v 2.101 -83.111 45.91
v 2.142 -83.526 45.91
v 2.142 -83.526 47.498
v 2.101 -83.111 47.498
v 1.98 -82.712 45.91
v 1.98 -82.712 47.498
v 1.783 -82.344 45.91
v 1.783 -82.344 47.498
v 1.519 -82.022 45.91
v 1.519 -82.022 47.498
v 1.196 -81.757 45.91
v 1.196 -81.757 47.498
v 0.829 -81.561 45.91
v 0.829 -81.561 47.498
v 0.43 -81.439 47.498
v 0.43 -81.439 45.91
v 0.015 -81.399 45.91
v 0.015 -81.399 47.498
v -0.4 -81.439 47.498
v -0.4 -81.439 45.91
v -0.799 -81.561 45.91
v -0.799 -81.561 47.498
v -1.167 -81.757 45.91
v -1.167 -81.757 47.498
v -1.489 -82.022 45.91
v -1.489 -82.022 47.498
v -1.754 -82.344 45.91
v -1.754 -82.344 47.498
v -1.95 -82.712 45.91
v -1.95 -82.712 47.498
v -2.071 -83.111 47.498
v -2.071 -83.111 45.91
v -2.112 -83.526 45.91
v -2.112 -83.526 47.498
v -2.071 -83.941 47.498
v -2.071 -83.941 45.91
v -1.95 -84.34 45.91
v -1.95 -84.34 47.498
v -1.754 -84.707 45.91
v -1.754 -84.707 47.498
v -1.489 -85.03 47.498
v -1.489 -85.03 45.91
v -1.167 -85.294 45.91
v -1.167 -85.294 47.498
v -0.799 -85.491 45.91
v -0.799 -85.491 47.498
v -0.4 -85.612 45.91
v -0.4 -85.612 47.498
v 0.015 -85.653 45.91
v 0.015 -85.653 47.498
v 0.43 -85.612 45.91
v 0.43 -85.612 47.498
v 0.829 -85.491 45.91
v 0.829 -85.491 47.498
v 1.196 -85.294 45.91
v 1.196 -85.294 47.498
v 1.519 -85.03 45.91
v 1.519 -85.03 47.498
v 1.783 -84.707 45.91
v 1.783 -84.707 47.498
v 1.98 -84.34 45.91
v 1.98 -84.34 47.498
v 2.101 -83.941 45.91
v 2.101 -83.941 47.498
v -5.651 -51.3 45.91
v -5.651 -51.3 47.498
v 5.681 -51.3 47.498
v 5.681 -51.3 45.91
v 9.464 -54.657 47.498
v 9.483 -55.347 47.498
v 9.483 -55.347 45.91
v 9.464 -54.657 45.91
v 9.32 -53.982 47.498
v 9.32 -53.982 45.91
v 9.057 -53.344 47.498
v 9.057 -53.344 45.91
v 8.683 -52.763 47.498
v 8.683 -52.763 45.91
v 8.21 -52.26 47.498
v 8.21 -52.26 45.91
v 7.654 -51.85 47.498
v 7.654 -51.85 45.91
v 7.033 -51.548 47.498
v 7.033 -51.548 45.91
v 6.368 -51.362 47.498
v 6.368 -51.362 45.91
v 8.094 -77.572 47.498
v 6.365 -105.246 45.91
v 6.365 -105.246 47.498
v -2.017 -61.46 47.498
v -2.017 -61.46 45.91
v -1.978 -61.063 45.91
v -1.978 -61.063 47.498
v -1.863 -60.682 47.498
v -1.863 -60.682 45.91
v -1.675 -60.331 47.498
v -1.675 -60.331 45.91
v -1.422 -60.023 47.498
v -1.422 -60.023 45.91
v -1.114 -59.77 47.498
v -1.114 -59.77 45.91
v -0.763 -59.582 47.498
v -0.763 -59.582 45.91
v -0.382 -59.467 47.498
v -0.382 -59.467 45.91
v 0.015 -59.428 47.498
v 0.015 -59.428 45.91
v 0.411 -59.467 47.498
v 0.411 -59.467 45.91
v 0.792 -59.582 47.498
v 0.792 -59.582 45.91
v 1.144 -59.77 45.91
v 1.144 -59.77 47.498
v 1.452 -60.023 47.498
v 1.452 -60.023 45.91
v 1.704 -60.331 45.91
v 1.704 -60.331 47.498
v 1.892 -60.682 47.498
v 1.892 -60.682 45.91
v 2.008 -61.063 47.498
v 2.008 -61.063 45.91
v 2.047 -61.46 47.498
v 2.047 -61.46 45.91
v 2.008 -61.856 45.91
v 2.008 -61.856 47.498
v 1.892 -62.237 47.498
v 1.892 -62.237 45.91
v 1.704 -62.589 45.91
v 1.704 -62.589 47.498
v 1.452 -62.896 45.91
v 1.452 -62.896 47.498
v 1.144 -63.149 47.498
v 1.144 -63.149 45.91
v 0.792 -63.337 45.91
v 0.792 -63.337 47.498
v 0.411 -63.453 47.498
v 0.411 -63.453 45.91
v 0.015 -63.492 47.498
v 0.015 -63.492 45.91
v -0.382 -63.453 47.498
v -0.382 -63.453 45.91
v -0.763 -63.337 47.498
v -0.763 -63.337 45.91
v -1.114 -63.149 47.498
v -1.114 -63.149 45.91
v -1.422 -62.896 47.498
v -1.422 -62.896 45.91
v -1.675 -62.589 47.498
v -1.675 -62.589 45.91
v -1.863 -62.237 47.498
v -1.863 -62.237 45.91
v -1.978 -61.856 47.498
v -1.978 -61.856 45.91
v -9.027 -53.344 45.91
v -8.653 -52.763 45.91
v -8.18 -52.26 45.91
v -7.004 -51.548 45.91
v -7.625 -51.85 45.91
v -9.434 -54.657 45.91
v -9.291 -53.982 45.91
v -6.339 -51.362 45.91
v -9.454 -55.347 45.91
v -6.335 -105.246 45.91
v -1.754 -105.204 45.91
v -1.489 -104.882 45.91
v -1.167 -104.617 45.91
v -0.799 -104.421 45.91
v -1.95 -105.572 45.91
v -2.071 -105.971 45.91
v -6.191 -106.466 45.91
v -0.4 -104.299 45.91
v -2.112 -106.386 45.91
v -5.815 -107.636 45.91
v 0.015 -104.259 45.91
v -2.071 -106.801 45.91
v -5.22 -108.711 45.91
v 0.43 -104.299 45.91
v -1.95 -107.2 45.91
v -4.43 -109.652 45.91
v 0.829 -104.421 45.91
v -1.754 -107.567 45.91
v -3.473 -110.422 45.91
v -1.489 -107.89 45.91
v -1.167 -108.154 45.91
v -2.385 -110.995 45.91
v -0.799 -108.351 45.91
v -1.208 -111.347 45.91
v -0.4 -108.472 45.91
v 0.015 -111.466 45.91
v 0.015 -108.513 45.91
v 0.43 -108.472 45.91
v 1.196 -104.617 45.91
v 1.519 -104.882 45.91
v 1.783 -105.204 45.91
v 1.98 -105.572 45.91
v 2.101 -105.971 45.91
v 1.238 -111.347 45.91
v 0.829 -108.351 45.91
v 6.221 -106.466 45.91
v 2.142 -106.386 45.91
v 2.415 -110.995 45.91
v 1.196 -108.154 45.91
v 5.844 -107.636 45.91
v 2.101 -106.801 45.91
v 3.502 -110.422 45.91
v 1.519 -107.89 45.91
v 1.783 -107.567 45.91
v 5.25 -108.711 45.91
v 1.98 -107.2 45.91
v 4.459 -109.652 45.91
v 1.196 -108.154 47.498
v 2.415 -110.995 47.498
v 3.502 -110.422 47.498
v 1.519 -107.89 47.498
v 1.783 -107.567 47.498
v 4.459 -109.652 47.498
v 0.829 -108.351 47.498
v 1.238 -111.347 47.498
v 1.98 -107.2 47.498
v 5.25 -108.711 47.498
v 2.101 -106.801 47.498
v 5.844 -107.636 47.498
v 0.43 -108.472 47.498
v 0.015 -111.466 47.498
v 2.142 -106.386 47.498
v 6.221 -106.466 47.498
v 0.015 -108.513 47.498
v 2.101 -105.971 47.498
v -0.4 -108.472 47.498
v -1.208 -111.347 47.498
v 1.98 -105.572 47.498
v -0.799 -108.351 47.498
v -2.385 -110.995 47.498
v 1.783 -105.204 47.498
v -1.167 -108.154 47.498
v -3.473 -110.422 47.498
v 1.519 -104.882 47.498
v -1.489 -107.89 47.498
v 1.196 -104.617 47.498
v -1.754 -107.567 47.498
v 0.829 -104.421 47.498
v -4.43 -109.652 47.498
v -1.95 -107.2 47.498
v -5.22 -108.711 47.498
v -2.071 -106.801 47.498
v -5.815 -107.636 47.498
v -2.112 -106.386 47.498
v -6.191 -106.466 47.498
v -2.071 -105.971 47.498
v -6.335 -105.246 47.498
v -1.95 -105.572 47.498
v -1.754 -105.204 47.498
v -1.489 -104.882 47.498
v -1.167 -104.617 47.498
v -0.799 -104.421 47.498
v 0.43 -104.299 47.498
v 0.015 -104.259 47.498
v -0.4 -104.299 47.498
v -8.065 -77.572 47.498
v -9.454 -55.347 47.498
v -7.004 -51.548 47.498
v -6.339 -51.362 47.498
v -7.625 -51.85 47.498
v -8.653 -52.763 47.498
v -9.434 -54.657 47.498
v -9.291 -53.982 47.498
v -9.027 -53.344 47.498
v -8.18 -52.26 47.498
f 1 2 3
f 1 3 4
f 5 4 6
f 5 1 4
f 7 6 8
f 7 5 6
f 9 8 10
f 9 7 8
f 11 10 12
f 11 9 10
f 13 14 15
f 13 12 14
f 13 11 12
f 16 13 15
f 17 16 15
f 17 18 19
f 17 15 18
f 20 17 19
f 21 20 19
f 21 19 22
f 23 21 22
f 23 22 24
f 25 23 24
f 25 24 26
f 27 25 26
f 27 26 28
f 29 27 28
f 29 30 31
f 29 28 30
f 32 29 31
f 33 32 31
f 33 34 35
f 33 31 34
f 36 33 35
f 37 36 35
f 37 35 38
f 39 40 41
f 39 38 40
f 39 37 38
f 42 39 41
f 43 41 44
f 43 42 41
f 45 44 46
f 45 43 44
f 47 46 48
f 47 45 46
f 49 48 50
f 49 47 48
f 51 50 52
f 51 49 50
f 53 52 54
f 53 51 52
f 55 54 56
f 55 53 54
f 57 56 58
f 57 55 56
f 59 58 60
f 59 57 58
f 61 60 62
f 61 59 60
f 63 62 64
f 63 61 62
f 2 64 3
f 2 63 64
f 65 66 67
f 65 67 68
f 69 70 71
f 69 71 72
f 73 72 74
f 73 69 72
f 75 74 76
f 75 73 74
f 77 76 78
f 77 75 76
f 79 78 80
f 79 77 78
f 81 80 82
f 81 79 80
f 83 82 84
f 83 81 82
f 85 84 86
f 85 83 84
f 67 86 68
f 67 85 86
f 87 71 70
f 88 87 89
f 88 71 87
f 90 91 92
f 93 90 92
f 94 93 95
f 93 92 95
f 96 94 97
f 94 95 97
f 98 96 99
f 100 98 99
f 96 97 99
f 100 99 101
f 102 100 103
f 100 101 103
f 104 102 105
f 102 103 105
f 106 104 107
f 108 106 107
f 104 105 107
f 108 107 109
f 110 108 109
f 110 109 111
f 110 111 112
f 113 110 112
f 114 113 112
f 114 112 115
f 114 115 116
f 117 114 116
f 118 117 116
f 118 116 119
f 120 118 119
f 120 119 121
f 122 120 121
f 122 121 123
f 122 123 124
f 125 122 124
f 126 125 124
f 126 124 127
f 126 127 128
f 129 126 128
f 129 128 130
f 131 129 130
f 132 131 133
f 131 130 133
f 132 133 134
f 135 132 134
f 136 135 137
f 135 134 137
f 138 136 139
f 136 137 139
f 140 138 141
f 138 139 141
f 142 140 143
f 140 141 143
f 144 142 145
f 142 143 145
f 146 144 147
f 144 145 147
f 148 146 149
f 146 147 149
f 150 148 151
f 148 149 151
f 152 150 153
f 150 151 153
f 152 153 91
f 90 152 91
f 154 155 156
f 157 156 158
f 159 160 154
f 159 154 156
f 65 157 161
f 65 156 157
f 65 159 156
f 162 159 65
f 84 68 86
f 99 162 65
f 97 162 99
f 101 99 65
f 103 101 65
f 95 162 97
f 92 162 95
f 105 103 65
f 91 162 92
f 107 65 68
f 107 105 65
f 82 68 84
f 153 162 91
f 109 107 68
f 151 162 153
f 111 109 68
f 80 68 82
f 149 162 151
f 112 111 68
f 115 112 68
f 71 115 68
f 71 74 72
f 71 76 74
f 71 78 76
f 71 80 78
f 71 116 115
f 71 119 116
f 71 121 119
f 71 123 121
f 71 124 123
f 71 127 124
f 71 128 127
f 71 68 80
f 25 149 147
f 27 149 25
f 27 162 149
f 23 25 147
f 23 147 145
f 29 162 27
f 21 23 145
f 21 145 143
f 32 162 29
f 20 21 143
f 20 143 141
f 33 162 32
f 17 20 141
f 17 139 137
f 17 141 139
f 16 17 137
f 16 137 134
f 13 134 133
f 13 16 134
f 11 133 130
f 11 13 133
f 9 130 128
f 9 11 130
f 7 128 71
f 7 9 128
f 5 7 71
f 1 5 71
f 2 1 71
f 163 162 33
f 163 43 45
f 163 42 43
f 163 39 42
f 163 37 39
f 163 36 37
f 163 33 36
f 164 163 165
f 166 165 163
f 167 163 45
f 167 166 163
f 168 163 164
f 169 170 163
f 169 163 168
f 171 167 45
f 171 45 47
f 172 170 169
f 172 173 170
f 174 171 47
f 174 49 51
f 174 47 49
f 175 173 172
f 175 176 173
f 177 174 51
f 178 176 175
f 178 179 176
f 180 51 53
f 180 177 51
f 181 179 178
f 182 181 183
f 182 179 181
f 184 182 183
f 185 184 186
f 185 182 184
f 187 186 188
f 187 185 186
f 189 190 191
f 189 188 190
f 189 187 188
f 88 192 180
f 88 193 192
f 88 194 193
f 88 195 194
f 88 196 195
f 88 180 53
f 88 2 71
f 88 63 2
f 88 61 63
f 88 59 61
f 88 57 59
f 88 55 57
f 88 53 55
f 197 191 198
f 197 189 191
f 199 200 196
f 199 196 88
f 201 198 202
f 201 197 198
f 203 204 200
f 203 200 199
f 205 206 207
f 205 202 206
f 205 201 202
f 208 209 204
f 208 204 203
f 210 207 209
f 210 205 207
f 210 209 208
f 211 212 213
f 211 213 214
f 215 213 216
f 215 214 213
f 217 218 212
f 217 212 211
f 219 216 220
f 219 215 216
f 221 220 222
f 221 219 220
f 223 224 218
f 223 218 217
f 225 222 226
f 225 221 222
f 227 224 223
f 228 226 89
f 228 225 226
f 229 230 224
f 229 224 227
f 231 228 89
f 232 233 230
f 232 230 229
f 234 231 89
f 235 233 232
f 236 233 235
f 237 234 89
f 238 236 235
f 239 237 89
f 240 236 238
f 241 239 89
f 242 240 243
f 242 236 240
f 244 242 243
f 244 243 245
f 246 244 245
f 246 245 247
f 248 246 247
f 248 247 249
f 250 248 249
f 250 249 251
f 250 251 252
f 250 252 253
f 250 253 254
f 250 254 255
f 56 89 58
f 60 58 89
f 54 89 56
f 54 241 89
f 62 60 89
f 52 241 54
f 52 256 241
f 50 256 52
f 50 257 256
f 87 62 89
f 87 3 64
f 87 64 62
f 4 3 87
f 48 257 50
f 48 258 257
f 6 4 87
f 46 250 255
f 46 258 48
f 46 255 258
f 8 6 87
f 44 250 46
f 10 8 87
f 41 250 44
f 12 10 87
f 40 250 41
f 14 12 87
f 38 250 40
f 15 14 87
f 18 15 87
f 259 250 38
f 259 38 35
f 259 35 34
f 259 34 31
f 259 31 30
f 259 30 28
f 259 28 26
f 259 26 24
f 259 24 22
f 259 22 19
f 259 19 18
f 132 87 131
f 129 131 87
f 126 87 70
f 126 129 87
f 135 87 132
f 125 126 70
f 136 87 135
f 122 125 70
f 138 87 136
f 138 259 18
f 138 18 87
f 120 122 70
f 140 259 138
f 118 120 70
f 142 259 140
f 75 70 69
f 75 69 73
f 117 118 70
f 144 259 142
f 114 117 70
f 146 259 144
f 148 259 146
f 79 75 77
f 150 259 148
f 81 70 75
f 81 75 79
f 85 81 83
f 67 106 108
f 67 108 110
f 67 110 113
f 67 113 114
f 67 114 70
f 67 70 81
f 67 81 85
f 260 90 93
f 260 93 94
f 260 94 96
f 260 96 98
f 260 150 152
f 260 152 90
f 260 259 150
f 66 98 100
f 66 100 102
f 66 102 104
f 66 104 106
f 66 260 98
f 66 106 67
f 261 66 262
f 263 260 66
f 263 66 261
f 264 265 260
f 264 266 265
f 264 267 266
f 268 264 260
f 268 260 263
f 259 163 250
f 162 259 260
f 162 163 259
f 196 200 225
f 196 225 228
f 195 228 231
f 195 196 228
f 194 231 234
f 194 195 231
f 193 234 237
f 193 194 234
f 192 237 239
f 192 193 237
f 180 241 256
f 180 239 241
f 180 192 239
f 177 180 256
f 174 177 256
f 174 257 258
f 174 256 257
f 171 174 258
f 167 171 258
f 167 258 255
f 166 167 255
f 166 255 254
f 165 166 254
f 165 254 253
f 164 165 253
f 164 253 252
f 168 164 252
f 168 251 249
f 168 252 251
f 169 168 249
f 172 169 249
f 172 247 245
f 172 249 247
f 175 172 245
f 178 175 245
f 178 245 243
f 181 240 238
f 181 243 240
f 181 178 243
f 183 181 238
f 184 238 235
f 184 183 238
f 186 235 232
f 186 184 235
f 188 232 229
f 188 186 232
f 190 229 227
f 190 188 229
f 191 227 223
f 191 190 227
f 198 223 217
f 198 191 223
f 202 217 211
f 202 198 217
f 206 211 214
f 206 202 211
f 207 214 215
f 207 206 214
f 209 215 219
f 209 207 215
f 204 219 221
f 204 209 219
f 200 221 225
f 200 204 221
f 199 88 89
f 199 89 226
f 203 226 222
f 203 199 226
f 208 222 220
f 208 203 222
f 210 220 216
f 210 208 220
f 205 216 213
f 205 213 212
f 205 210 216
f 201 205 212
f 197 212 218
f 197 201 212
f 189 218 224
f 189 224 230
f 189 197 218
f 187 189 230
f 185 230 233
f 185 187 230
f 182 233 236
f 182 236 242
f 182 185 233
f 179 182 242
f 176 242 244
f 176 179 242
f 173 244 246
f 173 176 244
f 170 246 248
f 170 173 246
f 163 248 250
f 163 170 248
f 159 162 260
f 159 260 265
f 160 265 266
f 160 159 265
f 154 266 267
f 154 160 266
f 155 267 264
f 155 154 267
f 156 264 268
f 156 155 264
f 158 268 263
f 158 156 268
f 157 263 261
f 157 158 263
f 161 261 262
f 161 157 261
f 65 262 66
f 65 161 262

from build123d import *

# Parameters (mm, degrees)
BOSS_EXTRUDE1_DEPTH      = 76.2
BOSS_EXTRUDE1_DEPTH_BACK = 76.2
CUT_EXTRUDE1_DEPTH       = 136.619651209
CUT_EXTRUDE1_DEPTH_BACK  = 136.619651209
FILLET1_R                = 3.81
SKETCH14_R               = 2.032
CUT_EXTRUDE8_DEPTH       = 156.372005628
CUT_EXTRUDE9_DEPTH       = 136.355460931
CUT_EXTRUDE9_DEPTH_BACK  = 136.355460931
SKETCH15_W               = 96.731852598
SKETCH15_H               = 147.433285995
SKETCH15_W_2             = 126.258869859
SKETCH15_H_2             = 31.294033563
CUT_EXTRUDE10_DEPTH      = 112.88020808
CUT_EXTRUDE10_DEPTH_BACK = 112.88020808
SKETCH16_R               = 2.127


with BuildPart() as part:
    # Sketch1 → Boss-Extrude1 (new, two sides: drawn at the far end of the back side and taken through both)
    with BuildSketch(Plane.XY.offset(-BOSS_EXTRUDE1_DEPTH_BACK)):
        with BuildLine():
            Line((-6.335258536, -105.245804705), (-12.685258536, -3.645804705))
            ThreePointArc((-12.685258536, -3.645804705), (0.014741464, 8.866413132), (12.714741464, -3.645804705))
            Line((12.714741464, -3.645804705), (6.364741464, -105.245804705))
            ThreePointArc((6.364741464, -105.245804705), (0.014741464, -111.465623147), (-6.335258536, -105.245804705))
        make_face()
    extrude(amount=BOSS_EXTRUDE1_DEPTH + BOSS_EXTRUDE1_DEPTH_BACK)

    # Sketch4 → Cut-Extrude1 (cut, two sides: drawn at the far end of the back side and taken through both)
    with BuildSketch(Plane(origin=(0, 0, 0), x_dir=(0, 0, -1), z_dir=(1, 0, 0)).offset(-CUT_EXTRUDE1_DEPTH_BACK)):
        Polygon((-47.498, -73.524605007), (-47.498, -51.299605007), (47.625, -51.299605007), (47.625, -73.524605007), (76.2, -73.524605007), (76.2, 8.866413132), (-76.2, 8.866413132), (-76.2, -28.682279346), (-76.2, -111.465623147), (-60.198, -111.465623147), (-60.198, -73.524605007), align=None)
    extrude(amount=CUT_EXTRUDE1_DEPTH + CUT_EXTRUDE1_DEPTH_BACK, mode=Mode.SUBTRACT)

    # Fillet1
    fillet1_edges = [part.edges().sort_by_distance(p)[0] for p in [
        (8.347316445, -73.524605007, 53.848),
        (9.736378945, -51.299605007, -0.0635),
        (-9.706896017, -51.299605007, -0.0635),
        (-8.317833517, -73.524605007, 53.848),
        (-8.317833517, -73.524605007, -61.9125),
        (8.347316445, -73.524605007, -61.9125),
    ]]
    fillet(fillet1_edges, radius=FILLET1_R)

    # Sketch14 → Cut-Extrude8 (cut, through all)
    with BuildSketch(Plane(origin=(0, 0, -47.625), x_dir=(-1, 0, 0), z_dir=(0, 0, -1))):
        with Locations((-0.014741464, -61.459605007)):
            Circle(SKETCH14_R)
    extrude(amount=-CUT_EXTRUDE8_DEPTH, mode=Mode.SUBTRACT)

    # Sketch15 → Cut-Extrude9 (cut, two sides: drawn at the far end of the back side and taken through both)
    with BuildSketch(Plane(origin=(0, 0, 0), x_dir=(1, 0, 0), z_dir=(0, 1, 0)).offset(-CUT_EXTRUDE9_DEPTH_BACK)):
        with Locations((-16.666713659, 27.806142998)):
            Rectangle(SKETCH15_W, SKETCH15_H)
        with Locations((-1.903205029, -63.145016782)):
            Rectangle(SKETCH15_W_2, SKETCH15_H_2)
    extrude(amount=CUT_EXTRUDE9_DEPTH + CUT_EXTRUDE9_DEPTH_BACK, mode=Mode.SUBTRACT)

    # Sketch16 → Cut-Extrude10 (cut, two sides: drawn at the far end of the back side and taken through both)
    with BuildSketch(Plane.XY.offset(47.498).offset(-CUT_EXTRUDE10_DEPTH_BACK)):
        with Locations((0.014741464, -106.385623147)):
            Circle(SKETCH16_R)
        with Locations((0.014741464, -83.525623147)):
            Circle(SKETCH16_R)
    extrude(amount=CUT_EXTRUDE10_DEPTH + CUT_EXTRUDE10_DEPTH_BACK, mode=Mode.SUBTRACT)


solid = part.part
